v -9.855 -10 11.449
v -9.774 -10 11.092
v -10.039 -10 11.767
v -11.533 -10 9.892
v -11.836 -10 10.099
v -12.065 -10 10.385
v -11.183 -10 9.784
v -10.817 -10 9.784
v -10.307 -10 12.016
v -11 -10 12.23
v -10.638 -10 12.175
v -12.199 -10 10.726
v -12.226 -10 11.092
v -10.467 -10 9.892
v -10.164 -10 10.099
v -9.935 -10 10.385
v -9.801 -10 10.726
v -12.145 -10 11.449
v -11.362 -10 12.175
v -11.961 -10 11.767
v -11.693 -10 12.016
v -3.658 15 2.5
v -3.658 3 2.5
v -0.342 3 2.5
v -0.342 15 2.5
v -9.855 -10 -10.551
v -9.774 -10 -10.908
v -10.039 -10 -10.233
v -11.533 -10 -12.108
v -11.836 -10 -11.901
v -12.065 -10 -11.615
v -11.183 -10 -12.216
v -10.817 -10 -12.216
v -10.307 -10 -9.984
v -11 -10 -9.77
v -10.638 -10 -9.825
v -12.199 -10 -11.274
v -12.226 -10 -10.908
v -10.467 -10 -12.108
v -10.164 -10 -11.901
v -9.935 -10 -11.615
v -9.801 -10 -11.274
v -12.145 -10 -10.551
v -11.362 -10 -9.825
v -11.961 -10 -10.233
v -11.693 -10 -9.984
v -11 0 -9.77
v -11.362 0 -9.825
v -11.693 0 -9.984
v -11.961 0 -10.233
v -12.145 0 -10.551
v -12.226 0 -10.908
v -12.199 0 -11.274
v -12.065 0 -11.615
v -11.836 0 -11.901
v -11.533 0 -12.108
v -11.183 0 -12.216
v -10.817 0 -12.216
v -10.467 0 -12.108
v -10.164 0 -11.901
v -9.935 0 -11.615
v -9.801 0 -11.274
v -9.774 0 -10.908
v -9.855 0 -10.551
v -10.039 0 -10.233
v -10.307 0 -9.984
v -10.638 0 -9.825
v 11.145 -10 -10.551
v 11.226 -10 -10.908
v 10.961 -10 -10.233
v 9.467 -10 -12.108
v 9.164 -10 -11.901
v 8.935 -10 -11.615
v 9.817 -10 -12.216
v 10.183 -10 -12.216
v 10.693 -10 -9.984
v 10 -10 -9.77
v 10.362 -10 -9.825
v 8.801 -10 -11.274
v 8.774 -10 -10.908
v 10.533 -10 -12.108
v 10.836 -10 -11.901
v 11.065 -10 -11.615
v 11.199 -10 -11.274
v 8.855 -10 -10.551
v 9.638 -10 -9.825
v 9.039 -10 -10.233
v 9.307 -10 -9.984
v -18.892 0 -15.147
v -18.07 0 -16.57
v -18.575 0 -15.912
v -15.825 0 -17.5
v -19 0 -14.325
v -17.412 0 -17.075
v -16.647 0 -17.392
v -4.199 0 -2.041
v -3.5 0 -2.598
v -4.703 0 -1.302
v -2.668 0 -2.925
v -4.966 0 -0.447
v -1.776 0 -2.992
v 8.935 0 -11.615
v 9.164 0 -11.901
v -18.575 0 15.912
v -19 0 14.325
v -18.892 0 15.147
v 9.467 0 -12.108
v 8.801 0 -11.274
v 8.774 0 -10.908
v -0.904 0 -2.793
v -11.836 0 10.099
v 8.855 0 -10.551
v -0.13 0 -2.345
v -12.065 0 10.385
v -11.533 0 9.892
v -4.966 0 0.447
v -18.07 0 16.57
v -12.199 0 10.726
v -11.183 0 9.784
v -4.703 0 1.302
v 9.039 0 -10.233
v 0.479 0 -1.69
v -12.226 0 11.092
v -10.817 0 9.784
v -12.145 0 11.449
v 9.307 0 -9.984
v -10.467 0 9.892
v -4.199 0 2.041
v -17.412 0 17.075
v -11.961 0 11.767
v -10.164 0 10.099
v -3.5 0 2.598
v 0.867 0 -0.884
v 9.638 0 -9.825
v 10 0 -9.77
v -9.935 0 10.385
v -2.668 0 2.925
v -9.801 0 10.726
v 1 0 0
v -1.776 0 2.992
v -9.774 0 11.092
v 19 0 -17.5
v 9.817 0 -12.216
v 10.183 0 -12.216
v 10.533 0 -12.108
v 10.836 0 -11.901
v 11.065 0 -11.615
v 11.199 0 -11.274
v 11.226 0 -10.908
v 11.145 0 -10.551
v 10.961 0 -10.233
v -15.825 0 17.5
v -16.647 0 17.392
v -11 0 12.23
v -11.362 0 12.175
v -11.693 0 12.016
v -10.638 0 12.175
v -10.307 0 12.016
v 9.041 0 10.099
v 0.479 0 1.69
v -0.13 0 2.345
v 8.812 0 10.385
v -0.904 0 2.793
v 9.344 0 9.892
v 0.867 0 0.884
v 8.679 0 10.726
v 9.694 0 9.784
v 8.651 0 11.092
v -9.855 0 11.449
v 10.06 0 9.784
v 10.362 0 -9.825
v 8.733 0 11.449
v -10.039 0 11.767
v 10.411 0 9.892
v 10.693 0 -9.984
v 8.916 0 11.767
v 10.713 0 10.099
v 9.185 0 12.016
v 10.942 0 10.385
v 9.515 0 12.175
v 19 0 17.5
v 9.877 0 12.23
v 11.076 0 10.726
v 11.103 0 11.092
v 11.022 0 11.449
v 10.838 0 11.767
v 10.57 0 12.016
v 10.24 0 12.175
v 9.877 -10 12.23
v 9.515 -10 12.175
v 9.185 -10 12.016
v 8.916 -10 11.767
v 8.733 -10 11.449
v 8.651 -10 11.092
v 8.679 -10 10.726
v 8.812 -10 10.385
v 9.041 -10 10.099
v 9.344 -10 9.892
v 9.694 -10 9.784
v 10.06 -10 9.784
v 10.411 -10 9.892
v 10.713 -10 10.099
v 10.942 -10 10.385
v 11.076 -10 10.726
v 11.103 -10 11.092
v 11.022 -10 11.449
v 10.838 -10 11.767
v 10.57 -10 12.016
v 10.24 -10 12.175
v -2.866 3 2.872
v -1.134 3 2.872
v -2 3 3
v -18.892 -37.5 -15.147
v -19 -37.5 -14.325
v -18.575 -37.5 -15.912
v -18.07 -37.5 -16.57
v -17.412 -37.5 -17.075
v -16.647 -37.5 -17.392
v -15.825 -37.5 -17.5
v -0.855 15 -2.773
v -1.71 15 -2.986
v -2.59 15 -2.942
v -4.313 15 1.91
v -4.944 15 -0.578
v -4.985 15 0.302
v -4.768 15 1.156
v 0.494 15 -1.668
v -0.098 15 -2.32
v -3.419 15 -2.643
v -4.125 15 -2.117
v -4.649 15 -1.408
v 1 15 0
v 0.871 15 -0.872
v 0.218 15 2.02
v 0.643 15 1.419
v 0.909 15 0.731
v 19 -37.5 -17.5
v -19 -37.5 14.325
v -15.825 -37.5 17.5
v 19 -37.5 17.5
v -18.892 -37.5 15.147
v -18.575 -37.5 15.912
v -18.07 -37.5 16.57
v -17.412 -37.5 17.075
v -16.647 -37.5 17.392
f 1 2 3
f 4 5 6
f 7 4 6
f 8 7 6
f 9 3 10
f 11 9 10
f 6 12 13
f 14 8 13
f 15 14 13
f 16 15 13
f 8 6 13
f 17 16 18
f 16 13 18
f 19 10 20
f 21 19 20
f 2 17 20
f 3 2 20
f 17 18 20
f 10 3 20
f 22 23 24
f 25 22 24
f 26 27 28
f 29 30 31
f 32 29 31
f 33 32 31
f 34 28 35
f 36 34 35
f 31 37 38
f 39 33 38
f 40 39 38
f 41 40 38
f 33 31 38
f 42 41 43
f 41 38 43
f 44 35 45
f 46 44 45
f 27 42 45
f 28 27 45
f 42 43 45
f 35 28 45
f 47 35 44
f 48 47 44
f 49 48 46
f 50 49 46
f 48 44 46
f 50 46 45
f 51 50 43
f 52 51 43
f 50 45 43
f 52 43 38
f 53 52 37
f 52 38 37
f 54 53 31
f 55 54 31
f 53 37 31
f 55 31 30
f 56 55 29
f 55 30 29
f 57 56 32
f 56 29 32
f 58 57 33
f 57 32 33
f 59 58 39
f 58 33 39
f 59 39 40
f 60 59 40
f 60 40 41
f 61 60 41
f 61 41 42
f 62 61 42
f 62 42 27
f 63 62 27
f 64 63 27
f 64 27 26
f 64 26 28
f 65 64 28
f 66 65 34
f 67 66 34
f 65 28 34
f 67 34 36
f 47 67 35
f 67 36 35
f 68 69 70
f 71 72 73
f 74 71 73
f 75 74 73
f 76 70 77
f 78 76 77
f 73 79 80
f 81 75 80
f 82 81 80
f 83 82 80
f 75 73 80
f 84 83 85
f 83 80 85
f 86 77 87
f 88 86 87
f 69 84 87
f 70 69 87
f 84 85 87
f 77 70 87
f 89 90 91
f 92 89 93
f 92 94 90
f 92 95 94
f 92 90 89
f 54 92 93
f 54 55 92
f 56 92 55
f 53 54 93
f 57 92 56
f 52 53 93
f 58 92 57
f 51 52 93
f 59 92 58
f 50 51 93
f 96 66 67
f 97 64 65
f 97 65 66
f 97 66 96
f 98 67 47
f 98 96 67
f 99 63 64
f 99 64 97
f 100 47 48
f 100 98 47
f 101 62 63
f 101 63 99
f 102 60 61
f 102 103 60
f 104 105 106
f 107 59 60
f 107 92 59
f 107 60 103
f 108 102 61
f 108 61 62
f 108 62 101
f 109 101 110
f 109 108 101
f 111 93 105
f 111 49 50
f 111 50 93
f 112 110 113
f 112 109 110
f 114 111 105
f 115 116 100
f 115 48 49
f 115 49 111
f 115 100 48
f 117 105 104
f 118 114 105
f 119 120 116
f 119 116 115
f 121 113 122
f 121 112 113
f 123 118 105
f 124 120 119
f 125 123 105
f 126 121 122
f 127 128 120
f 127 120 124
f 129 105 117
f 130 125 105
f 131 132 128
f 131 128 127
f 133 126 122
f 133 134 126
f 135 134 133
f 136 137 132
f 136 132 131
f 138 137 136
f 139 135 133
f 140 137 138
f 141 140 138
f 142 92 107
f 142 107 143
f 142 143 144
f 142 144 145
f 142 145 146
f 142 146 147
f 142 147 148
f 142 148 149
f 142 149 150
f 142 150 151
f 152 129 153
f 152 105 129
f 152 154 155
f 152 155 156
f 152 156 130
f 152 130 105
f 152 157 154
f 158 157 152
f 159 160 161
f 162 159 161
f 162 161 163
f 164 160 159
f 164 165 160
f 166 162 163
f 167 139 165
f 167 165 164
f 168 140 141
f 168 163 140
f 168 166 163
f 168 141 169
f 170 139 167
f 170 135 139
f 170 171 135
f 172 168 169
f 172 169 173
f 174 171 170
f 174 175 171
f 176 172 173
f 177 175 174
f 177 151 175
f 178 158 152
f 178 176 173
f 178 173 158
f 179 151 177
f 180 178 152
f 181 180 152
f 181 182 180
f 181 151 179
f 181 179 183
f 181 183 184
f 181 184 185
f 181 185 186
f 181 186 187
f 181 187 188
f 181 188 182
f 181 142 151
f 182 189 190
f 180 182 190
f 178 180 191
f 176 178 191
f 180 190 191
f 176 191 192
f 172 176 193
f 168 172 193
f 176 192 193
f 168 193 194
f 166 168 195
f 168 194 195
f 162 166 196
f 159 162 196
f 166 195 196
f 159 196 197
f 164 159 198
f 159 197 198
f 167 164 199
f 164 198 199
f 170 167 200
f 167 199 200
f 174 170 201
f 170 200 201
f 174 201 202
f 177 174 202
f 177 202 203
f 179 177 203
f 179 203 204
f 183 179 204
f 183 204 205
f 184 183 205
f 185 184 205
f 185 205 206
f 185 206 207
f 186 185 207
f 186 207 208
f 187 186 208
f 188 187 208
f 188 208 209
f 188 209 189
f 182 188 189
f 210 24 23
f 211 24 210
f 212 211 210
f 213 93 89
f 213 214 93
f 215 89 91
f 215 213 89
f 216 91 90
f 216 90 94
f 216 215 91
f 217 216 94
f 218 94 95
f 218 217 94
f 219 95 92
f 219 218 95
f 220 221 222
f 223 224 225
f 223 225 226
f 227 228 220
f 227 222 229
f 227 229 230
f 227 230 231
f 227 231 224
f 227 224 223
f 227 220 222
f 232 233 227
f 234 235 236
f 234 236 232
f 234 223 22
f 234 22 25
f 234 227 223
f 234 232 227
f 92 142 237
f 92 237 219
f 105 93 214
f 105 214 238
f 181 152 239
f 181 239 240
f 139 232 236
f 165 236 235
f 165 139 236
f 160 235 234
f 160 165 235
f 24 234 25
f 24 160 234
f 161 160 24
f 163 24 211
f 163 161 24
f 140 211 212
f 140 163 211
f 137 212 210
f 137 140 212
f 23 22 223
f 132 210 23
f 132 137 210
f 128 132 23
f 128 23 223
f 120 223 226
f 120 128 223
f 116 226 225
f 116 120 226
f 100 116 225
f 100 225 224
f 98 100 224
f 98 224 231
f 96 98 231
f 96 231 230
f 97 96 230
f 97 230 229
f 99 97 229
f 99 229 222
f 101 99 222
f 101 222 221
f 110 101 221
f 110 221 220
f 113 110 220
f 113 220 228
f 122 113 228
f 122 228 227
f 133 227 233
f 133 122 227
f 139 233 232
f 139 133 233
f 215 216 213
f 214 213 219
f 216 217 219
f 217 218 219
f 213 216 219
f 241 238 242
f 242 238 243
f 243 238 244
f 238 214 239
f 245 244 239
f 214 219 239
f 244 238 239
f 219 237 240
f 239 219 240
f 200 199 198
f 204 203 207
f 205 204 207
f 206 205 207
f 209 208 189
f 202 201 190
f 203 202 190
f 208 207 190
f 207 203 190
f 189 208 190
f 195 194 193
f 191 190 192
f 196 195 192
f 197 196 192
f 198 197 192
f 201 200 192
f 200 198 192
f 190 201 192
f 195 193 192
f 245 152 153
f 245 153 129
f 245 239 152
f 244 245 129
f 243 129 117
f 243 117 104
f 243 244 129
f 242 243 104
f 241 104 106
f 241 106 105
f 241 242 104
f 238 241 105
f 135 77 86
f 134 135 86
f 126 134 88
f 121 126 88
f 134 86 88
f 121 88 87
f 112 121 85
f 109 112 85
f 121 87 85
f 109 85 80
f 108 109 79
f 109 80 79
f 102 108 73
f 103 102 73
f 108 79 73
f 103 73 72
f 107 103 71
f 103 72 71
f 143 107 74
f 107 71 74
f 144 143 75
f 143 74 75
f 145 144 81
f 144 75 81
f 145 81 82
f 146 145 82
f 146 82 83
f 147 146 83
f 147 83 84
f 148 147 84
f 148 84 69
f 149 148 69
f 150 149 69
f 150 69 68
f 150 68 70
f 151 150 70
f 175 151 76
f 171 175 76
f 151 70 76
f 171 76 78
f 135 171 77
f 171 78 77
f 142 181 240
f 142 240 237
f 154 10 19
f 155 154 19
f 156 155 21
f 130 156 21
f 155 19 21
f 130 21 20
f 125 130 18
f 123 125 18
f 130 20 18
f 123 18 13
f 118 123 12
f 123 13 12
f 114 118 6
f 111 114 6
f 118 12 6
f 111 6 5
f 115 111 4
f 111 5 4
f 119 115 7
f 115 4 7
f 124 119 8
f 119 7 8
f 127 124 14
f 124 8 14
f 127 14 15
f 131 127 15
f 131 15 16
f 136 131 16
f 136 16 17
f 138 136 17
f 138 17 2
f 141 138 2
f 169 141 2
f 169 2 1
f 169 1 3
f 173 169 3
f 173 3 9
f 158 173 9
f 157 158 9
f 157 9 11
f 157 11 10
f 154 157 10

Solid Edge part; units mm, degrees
sketch "Sketch1" plane through (0, 0, 0) normal (0, -1, 0) x (1, 0, 0)
  line L0 (-19, 17.5) -> (19, 17.5)
  line L1 (19, 17.5) -> (19, -17.5)
  line L2 (19, -17.5) -> (-19, -17.5)
  line L3 (-19, -17.5) -> (-19, 17.5)
  dimension "D1" = 35
  dimension "D2" = 38
extrude "Protrusion1" add sketch "Sketch1" along normal blind 37.5
hole "Hole_1" at (10, 0, -11) direction (0, -1, 0) diameter 2.459 depth 10
hole "Hole1" at (-11, 0, 11) direction (0, -1, 0) diameter 2.459 depth 10
hole "Hole2" at (9.8772, 0, 11) direction (0, -1, 0) diameter 2.459 depth 10
hole "Hole3" at (-11, 0, -11) direction (0, -1, 0) diameter 2.459 depth 10
fillet "Round_1" radius 3.175 2 edges at (-19, -18.75, -17.5) (-19, -18.75, 17.5)
sketch "Sketch2" plane through (0, 0, 0) normal (0, 1, 0) x (1, 0, 0)
  circle A0 centre (-2, 0) radius 3
  dimension "D1" = 6
  dimension "D2" = 17
extrude "ExtrudedProtrusion_3" add sketch "Sketch2" along normal blind 15
sketch "Sketch3" plane through (-2, 15, 0) normal (0, 1, 0) x (1, 0, 0)
  line L0 (-1.6583, -2.5) -> (1.6583, -2.5)
  arc A0 (1.6583, -2.5) -> (-1.6583, -2.5) centre (0, 0) cw
extrude "ExtrudedCutout_1" cut sketch "Sketch3" against normal blind 12
